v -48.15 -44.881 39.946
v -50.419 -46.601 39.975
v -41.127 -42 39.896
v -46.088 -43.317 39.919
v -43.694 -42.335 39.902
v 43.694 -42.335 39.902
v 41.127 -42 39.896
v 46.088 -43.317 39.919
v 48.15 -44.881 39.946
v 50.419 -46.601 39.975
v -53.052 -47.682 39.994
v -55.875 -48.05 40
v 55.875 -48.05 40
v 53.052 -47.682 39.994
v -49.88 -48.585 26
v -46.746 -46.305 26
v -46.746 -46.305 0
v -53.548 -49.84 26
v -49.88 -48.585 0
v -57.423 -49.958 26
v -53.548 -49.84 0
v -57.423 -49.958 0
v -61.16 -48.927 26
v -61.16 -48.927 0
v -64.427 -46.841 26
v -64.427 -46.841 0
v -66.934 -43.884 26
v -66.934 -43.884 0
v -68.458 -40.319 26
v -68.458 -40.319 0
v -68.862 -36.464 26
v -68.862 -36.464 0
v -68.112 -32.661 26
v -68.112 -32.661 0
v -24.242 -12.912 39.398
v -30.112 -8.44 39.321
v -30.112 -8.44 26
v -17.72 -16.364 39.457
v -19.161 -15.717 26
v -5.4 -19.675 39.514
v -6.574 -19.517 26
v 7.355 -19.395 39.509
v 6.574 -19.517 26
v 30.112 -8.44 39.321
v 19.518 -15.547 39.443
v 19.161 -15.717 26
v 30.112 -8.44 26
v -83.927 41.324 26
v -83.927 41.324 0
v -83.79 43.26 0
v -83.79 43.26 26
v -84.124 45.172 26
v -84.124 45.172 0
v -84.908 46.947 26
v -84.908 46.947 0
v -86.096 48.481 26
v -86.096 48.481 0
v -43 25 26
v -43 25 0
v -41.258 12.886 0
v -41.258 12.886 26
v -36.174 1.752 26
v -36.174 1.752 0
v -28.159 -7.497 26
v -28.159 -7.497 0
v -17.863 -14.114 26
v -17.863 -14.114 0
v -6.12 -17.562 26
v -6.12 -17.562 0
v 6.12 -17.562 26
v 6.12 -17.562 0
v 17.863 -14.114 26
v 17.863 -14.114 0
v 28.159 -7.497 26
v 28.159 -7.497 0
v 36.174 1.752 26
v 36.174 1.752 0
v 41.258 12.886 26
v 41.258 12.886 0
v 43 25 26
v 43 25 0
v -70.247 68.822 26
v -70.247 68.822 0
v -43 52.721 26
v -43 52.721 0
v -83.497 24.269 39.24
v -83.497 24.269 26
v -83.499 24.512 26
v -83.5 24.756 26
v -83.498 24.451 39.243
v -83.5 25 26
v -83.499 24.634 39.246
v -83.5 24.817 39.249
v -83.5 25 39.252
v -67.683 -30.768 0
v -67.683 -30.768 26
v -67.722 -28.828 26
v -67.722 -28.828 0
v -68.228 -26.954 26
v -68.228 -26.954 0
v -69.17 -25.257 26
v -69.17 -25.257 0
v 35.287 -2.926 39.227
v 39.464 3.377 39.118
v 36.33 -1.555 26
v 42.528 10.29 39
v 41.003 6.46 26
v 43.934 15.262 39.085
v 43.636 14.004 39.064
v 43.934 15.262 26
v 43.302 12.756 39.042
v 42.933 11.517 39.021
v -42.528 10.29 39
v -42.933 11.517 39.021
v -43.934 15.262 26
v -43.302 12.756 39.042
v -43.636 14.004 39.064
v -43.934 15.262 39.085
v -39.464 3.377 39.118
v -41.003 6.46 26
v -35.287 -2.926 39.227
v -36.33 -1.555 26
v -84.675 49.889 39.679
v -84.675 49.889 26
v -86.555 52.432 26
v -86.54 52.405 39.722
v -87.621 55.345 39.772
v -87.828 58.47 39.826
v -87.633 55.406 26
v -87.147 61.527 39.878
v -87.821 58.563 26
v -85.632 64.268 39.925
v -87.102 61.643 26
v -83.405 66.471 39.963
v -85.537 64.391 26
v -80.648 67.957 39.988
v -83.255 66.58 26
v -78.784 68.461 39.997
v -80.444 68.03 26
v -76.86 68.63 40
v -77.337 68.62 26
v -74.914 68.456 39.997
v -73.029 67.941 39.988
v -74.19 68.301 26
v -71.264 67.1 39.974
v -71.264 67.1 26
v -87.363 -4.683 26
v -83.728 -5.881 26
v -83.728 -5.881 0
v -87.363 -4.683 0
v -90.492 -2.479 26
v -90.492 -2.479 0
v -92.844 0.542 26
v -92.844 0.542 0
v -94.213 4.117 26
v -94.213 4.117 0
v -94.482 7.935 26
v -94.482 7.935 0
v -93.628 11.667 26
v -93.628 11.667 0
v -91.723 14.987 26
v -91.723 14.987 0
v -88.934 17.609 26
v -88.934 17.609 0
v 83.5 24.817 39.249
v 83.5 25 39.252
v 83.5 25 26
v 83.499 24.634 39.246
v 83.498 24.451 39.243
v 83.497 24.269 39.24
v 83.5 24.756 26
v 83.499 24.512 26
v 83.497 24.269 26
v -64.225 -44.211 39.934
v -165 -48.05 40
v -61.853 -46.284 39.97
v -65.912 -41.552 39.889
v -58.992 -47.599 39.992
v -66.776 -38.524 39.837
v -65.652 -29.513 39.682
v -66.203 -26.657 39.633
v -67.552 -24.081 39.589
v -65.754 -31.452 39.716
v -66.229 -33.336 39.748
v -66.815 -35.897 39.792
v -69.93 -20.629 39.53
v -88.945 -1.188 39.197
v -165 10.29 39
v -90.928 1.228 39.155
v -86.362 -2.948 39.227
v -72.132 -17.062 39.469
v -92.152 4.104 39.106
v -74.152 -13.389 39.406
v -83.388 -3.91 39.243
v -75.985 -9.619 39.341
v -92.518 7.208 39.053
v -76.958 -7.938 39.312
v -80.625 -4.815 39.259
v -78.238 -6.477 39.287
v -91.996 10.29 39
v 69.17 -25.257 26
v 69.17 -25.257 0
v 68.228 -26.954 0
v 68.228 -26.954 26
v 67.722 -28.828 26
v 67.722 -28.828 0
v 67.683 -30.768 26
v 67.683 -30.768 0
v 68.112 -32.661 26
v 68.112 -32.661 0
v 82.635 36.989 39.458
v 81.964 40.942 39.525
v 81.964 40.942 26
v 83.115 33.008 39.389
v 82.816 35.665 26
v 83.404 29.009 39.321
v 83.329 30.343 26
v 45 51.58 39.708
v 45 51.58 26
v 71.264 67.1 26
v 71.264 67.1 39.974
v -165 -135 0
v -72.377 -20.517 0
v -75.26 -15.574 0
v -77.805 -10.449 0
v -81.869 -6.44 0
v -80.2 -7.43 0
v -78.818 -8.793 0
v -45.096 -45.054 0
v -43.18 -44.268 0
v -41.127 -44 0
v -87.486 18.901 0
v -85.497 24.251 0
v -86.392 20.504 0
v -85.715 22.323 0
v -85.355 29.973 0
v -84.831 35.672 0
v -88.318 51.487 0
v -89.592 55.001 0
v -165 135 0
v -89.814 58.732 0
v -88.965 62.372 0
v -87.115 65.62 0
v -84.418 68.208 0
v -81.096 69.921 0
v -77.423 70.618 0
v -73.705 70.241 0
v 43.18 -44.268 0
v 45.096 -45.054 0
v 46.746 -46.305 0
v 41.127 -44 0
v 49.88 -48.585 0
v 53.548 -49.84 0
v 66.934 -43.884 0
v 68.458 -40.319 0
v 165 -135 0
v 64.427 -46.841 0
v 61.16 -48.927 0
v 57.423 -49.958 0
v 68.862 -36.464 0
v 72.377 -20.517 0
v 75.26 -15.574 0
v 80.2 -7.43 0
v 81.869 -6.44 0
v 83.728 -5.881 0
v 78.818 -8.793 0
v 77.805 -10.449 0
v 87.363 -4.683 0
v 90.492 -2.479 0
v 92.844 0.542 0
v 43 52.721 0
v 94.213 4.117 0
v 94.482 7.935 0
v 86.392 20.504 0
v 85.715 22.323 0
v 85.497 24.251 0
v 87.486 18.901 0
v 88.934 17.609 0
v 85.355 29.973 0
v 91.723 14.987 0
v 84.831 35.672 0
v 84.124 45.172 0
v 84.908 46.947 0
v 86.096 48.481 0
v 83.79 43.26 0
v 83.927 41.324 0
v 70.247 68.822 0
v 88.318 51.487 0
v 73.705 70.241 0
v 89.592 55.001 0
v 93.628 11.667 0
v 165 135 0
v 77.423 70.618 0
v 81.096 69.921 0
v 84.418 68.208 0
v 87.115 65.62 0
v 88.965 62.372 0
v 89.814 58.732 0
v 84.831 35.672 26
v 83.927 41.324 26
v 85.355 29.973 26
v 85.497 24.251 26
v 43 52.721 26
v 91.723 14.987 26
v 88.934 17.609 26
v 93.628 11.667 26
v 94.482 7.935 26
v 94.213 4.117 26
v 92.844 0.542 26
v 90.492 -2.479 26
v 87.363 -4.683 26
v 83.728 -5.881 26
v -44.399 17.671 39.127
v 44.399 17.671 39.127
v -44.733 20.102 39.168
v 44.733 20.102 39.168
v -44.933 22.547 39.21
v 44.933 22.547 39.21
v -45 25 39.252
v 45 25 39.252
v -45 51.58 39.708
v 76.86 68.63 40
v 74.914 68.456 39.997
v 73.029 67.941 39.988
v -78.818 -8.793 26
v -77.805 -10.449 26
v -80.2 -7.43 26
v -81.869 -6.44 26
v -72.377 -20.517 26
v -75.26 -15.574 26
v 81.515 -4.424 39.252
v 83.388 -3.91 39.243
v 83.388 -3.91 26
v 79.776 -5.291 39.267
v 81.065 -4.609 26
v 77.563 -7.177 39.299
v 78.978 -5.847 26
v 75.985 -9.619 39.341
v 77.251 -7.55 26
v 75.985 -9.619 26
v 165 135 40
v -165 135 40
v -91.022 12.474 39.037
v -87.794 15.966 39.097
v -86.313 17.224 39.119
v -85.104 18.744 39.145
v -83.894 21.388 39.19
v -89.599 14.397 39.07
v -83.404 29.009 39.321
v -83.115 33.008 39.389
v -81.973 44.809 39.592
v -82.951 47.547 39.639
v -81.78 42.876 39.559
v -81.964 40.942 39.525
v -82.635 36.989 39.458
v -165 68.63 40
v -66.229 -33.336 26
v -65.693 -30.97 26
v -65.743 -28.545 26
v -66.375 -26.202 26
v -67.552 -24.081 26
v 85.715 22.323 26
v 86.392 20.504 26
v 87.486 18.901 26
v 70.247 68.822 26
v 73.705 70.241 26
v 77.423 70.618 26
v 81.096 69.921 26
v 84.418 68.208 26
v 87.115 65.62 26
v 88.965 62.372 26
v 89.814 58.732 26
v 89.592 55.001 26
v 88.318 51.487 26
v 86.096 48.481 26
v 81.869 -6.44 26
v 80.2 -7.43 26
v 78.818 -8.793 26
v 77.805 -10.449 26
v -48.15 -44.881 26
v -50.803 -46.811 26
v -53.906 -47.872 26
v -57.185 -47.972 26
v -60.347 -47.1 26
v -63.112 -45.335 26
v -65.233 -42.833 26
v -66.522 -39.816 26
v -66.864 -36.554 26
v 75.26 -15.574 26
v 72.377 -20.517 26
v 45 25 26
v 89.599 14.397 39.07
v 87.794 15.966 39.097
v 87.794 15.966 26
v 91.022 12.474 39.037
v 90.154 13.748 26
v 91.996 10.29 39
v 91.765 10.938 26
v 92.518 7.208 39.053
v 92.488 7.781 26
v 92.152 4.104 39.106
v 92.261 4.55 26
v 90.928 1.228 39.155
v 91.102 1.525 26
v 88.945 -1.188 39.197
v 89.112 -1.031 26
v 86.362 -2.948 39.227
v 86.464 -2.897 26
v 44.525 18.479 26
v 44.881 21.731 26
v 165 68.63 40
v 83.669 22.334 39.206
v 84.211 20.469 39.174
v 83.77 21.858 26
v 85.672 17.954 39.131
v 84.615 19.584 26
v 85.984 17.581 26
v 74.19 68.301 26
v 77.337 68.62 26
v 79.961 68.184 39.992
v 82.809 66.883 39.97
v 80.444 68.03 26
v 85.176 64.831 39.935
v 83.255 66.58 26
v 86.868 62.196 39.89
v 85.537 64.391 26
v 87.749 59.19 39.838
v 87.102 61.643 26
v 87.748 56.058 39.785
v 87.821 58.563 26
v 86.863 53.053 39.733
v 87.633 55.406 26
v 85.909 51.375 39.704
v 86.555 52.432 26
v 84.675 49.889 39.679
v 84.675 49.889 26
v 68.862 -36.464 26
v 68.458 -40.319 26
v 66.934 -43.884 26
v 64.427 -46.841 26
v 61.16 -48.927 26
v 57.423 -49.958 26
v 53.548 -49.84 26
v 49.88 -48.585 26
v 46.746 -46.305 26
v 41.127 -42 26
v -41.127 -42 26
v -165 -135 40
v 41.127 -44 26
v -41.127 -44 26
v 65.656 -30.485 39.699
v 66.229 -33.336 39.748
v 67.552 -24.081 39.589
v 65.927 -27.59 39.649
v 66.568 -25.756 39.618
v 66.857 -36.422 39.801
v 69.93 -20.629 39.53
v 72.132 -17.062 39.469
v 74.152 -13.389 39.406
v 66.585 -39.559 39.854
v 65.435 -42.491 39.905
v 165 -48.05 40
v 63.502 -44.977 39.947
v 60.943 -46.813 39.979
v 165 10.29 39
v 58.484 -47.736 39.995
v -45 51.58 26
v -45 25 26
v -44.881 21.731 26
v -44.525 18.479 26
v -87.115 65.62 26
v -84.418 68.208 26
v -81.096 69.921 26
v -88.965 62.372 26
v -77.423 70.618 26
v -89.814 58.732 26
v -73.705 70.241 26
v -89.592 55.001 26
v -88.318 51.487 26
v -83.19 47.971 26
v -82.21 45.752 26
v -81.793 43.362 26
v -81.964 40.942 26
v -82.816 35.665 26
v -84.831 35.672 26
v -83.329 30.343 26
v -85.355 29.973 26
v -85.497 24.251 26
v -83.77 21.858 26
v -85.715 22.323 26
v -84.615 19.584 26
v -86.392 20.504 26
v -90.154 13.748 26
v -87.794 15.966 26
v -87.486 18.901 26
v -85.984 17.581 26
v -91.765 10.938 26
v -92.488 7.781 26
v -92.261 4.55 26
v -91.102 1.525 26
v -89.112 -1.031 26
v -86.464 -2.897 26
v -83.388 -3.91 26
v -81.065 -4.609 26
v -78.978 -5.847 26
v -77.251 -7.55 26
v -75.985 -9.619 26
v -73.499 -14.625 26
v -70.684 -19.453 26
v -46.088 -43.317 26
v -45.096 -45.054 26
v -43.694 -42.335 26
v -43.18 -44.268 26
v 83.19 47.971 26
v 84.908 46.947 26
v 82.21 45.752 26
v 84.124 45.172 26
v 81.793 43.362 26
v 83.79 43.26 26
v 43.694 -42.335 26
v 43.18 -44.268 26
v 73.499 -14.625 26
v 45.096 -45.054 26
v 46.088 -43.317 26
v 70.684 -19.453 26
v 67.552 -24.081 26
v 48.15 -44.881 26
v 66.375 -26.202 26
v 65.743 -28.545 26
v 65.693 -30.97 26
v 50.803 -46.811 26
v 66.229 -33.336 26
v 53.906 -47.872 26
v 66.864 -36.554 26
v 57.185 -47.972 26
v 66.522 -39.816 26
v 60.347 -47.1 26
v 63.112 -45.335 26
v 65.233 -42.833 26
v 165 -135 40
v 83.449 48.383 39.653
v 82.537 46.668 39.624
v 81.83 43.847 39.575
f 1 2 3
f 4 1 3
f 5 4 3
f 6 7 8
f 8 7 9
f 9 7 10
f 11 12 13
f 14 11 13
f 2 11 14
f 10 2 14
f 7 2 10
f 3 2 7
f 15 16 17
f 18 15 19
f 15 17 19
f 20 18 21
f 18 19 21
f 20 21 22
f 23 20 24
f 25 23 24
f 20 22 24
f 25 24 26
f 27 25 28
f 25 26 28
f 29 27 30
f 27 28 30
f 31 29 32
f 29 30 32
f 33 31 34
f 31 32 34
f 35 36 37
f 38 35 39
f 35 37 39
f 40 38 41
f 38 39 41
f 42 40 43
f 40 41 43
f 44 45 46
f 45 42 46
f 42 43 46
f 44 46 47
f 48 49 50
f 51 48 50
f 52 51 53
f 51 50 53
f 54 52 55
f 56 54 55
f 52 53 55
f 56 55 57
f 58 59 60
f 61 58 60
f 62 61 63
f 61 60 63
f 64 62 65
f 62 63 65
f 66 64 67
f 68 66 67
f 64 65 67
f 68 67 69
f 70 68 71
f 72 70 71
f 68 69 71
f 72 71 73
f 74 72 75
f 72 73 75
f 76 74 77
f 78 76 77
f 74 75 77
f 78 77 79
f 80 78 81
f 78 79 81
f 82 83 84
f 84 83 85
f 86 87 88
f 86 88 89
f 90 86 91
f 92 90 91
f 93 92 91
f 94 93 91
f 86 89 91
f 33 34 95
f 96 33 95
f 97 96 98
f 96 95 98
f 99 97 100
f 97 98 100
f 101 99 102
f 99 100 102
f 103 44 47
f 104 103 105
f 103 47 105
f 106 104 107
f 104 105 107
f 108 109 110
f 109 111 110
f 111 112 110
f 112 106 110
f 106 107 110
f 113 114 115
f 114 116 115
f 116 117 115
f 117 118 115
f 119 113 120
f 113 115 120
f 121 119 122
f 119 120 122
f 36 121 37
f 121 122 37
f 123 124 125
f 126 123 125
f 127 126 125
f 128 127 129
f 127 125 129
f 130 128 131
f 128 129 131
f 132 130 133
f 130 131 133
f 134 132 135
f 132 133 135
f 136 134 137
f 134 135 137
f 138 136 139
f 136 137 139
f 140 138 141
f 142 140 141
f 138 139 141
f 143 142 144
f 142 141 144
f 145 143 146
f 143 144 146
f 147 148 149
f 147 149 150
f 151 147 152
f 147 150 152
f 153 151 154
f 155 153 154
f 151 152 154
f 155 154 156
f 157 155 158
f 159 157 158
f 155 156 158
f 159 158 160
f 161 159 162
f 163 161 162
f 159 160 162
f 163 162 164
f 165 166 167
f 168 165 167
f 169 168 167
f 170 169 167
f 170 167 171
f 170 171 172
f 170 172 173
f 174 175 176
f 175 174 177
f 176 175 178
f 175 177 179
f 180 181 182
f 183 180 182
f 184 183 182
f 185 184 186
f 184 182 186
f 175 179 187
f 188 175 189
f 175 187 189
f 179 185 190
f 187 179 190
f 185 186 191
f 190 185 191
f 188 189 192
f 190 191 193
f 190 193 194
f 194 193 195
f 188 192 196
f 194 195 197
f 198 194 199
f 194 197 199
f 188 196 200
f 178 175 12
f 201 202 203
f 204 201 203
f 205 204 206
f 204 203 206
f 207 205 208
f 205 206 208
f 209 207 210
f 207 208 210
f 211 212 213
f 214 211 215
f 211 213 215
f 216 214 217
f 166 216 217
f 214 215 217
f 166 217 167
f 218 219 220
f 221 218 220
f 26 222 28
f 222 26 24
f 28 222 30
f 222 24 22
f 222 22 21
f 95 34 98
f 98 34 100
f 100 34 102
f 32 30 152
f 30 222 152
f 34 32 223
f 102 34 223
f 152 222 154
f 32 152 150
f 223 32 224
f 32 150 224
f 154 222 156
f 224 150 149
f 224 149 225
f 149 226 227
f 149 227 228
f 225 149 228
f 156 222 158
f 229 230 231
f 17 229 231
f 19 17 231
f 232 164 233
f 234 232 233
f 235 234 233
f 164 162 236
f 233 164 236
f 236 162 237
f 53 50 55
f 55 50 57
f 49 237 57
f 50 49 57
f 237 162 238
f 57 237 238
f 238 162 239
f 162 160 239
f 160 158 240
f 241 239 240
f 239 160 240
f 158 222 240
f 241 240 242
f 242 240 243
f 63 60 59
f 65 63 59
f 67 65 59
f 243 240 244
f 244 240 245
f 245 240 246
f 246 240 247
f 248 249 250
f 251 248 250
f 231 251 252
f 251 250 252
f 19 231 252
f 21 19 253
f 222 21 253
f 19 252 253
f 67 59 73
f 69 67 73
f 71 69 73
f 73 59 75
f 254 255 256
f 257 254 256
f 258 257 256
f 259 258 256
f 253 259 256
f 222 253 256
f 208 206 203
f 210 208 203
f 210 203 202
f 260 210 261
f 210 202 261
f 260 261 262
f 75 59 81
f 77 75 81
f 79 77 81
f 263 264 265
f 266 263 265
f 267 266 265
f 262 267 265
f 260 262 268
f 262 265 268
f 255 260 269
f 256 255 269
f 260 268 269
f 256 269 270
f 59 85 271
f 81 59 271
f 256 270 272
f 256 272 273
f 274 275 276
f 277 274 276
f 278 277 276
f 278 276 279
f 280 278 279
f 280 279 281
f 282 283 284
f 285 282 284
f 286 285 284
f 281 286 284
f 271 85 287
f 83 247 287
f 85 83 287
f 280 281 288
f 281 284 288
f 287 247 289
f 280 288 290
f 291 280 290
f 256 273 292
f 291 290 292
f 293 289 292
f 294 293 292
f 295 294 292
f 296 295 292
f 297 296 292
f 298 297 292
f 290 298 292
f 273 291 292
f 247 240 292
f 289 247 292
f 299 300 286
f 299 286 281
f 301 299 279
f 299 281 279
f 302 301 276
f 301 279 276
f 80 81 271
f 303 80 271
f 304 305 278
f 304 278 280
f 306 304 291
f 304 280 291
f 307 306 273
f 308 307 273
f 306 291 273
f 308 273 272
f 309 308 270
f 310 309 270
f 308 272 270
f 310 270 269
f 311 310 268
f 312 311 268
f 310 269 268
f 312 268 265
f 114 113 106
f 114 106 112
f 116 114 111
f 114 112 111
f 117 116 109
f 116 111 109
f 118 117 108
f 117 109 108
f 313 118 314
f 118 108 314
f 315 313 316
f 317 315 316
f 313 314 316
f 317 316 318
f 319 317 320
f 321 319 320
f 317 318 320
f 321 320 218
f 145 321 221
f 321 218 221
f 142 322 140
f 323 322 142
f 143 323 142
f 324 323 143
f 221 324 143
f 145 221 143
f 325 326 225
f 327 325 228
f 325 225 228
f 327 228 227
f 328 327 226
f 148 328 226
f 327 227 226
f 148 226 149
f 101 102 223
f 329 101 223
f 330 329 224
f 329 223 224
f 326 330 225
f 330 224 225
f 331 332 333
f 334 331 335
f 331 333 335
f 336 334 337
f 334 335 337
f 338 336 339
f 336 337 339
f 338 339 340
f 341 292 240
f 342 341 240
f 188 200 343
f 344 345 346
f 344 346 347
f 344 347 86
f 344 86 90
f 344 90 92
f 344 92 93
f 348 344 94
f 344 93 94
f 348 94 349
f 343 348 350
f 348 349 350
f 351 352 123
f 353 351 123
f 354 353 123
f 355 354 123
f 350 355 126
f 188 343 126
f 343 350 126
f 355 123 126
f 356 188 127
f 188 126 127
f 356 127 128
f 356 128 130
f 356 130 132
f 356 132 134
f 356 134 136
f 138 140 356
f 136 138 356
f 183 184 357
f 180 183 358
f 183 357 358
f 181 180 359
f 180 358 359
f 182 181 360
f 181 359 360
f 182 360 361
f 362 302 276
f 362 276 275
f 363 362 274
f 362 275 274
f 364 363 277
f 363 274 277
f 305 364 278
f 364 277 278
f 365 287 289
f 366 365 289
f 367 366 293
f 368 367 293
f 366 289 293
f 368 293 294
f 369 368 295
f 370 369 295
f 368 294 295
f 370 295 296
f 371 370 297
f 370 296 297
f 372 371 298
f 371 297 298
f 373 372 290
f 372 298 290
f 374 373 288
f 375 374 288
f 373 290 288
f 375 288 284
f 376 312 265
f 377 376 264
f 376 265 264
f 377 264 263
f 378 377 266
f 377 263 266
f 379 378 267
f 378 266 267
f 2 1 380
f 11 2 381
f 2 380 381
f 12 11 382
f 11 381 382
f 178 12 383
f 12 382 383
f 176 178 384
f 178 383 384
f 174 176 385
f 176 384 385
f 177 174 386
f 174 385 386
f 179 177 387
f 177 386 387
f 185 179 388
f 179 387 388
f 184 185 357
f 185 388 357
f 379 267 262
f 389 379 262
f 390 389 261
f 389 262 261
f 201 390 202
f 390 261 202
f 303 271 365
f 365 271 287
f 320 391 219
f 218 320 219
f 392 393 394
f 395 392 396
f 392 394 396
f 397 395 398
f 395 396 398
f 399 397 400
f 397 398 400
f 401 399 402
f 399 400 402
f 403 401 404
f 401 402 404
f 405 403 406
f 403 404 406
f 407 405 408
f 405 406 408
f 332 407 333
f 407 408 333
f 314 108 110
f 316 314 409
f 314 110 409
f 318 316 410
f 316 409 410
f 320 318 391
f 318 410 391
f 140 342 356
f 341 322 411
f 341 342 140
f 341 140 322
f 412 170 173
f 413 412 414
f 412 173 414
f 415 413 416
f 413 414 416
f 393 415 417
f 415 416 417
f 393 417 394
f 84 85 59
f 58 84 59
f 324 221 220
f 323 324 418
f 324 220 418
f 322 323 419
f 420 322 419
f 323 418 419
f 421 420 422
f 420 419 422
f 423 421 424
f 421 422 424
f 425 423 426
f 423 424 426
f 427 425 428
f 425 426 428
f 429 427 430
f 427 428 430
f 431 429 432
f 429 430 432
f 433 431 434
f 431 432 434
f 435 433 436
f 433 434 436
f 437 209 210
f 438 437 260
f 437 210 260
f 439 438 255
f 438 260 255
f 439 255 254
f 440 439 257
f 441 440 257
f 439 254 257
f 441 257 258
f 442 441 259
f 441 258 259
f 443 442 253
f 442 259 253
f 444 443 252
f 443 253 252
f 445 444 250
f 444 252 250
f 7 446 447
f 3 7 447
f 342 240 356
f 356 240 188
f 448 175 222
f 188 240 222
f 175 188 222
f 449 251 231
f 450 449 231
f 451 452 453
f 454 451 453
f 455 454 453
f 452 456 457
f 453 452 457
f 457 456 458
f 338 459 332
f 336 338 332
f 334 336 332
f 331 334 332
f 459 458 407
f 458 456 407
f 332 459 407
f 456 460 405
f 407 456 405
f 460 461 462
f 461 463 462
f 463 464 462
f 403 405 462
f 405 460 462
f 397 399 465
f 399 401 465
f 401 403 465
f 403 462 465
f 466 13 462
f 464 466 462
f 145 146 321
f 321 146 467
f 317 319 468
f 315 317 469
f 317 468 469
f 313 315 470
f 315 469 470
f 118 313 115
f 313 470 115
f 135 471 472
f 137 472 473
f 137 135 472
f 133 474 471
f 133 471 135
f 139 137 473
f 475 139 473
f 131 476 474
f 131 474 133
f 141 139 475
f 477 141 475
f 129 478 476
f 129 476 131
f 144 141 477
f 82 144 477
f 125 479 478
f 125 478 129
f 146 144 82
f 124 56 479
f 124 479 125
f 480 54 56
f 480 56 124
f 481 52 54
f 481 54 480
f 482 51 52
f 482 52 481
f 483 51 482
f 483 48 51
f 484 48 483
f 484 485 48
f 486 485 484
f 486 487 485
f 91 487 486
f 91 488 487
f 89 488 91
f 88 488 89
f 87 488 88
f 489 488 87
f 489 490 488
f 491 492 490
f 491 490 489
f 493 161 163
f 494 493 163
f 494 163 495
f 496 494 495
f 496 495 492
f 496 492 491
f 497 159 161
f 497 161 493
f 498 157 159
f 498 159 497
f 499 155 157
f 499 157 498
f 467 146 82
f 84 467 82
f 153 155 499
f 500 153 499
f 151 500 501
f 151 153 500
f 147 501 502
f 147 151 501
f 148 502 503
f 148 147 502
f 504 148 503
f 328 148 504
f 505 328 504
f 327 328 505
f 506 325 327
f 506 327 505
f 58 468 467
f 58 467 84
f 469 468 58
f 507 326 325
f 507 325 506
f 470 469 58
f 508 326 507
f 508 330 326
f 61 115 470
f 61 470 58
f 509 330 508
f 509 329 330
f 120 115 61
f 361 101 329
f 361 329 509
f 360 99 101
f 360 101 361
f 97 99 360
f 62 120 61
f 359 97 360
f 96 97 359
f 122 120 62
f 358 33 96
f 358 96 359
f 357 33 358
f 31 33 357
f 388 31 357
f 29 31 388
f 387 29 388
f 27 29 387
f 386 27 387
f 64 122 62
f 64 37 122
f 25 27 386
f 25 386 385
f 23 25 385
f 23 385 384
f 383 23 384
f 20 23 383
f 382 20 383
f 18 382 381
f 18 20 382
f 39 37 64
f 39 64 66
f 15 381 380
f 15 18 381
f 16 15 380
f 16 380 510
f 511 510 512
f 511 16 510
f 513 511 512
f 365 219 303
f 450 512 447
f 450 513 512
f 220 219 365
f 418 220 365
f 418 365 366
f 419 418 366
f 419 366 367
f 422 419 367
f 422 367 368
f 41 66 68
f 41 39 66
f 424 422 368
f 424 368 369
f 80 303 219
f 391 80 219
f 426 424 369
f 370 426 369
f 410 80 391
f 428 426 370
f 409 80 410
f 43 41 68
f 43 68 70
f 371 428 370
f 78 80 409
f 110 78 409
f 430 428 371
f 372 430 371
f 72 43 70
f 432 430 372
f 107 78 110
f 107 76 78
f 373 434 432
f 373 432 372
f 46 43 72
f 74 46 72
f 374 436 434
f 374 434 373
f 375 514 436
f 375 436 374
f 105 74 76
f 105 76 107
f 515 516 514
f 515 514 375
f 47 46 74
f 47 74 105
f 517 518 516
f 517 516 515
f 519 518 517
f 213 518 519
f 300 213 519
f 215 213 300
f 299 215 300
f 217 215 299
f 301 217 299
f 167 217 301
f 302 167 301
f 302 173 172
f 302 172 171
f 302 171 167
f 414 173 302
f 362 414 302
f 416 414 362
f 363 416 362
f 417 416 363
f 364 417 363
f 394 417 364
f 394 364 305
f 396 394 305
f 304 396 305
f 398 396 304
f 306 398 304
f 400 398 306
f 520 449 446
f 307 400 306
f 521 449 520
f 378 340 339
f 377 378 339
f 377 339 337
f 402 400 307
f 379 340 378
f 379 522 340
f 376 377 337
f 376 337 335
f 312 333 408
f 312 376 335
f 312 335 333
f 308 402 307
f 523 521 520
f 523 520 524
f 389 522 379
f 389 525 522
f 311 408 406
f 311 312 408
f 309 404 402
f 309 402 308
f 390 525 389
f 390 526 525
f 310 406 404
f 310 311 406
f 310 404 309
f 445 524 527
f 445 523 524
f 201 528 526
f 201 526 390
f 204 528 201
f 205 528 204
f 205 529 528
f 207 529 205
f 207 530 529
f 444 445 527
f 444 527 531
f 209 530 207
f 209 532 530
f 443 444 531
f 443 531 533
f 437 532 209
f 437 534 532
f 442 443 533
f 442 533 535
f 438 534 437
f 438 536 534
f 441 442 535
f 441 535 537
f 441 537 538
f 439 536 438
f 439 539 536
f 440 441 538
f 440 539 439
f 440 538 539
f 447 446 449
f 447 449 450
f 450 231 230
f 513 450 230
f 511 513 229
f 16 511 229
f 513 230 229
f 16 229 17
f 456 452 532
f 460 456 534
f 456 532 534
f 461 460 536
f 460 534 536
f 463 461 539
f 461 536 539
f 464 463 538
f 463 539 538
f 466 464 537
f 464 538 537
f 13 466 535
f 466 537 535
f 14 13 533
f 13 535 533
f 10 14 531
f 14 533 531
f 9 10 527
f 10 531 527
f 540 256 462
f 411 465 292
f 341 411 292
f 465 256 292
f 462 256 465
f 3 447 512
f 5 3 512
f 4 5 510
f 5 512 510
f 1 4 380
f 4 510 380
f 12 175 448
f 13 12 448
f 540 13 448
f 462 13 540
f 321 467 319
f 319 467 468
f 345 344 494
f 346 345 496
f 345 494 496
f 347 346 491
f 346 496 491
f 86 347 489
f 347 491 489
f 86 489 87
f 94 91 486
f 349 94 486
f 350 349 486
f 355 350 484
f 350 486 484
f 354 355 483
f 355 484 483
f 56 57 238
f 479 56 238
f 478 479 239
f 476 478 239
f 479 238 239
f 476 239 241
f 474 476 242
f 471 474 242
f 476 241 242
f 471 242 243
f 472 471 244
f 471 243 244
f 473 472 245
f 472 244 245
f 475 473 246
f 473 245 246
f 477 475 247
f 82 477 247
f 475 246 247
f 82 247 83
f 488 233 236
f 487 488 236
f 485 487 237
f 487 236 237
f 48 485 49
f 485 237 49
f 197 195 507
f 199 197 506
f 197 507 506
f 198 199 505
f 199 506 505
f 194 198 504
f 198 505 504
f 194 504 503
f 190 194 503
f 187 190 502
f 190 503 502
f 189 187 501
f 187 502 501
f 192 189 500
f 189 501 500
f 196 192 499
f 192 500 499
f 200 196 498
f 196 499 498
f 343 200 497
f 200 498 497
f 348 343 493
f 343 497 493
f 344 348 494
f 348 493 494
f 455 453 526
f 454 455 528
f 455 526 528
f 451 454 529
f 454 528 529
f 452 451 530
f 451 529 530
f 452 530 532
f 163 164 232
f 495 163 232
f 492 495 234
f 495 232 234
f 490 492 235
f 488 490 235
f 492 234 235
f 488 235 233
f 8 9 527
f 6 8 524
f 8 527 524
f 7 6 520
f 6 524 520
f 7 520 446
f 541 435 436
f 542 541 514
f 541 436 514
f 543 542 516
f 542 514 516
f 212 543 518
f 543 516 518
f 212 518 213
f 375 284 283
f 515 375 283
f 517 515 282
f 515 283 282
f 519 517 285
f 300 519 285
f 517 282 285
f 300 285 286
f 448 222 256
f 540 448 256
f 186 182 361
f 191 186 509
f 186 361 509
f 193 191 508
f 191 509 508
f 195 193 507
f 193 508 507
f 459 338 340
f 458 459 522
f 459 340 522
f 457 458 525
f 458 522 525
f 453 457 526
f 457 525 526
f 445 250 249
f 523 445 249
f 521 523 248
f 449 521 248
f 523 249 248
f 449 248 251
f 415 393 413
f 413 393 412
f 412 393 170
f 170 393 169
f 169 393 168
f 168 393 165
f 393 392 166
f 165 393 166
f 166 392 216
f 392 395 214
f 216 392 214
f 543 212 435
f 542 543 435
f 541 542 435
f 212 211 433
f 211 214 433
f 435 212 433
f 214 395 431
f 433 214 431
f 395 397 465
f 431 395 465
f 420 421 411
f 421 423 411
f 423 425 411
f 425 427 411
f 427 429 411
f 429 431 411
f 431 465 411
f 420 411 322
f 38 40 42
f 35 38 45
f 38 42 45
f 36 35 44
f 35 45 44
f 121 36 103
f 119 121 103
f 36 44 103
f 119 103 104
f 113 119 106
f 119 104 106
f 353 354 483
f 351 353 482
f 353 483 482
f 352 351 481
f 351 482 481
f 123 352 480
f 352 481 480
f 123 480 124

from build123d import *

# Parameters (mm, degrees)
F1_DEPTH = 40
F3_DEPTH = 26
F6_DEPTH = 376


with BuildPart() as f1:
    # F0 (on Top) → F1 (new body)
    with BuildSketch(Plane.XY):
        with BuildLine():
            Line((165, -135), (165, 25))
            Line((165, 25), (83.5, 25))
            ThreePointArc((83.5, 25), (83.4991991535, 24.6342942061), (83.4967966293, 24.2685954271))
            ThreePointArc((83.4967966293, 24.2685954271), (84.6154885355, 19.5843531992), (87.7939862549, 15.9662391769))
            ThreePointArc((87.7939862549, 15.9662391769), (92.2606519972, 4.5495209581), (83.3881264287, -3.9104345842))
            ThreePointArc((83.3881264287, -3.9104345842), (78.9784767448, -5.8465612578), (75.9852018745, -9.6193456912))
            ThreePointArc((75.9852018745, -9.6193456912), (72.1319392895, -17.0622554594), (67.5519565242, -24.0813933151))
            ThreePointArc((67.5519565242, -24.0813933151), (65.7426065331, -28.544559169), (66.2292845484, -33.3358785427))
            ThreePointArc((66.2292845484, -33.3358785427), (61.7955930136, -46.3209199003), (48.1502490008, -44.880952381))
            ThreePointArc((48.1502490008, -44.880952381), (44.922849365, -42.7482305425), (41.1274887886, -42))
            Line((41.1274887886, -42), (-41.1274887886, -42))
            ThreePointArc((-41.1274887886, -42), (-44.922849365, -42.7482305425), (-48.1502490008, -44.880952381))
            ThreePointArc((-48.1502490008, -44.880952381), (-61.7955930136, -46.3209199003), (-66.2292845484, -33.3358785427))
            ThreePointArc((-66.2292845484, -33.3358785427), (-65.7426065331, -28.544559169), (-67.5519565242, -24.0813933151))
            ThreePointArc((-67.5519565242, -24.0813933151), (-72.1319392895, -17.0622554594), (-75.9852018745, -9.6193456912))
            ThreePointArc((-75.9852018745, -9.6193456912), (-78.9784767448, -5.8465612578), (-83.3881264287, -3.9104345842))
            ThreePointArc((-83.3881264287, -3.9104345842), (-92.2606519972, 4.5495209581), (-87.7939862549, 15.9662391769))
            ThreePointArc((-87.7939862549, 15.9662391769), (-84.6154885355, 19.5843531992), (-83.4967966293, 24.2685954271))
            ThreePointArc((-83.4967966293, 24.2685954271), (-83.4991991535, 24.6342942061), (-83.5, 25))
            Line((-83.5, 25), (-165, 25))
            Line((-165, 25), (-165, -135))
            Line((-165, -135), (165, -135))
        make_face()
        with BuildLine():
            Line((165, 25), (165, 135))
            Line((165, 135), (-165, 135))
            Line((-165, 135), (-165, 25))
            Line((-165, 25), (-83.5, 25))
            ThreePointArc((-83.5, 25), (-83.1151125621, 33.0079999869), (-81.9639984721, 40.9421753368))
            ThreePointArc((-81.9639984721, 40.9421753368), (-82.2099154551, 45.7518657289), (-84.6754899777, 49.8888379435))
            ThreePointArc((-84.6754899777, 49.8888379435), (-85.5373543192, 64.3910516772), (-71.2643792291, 67.1001466184))
            Line((-71.2643792291, 67.1001466184), (-45, 51.58))
            Line((-45, 51.58), (-45, 44.1040966114))
            Line((-45, 44.1040966114), (-45, 25))
            Line((-45, 25), (0, 25))
            Line((0, 25), (45, 25))
            Line((45, 25), (45, 44.1040966114))
            Line((45, 44.1040966114), (45, 51.58))
            Line((45, 51.58), (71.2643792291, 67.1001466184))
            ThreePointArc((71.2643792291, 67.1001466184), (85.5373543192, 64.3910516772), (84.6754899777, 49.8888379435))
            ThreePointArc((84.6754899777, 49.8888379435), (82.2099154551, 45.7518657289), (81.9639984721, 40.9421753368))
            ThreePointArc((81.9639984721, 40.9421753368), (83.1151125621, 33.0079999869), (83.5, 25))
            Line((83.5, 25), (165, 25))
        make_face()
        with BuildLine():
            Line((0, 25), (-45, 25))
            ThreePointArc((-45, 25), (-44.7326165754, 20.1017335398), (-43.9336438082, 15.2616766467))
            Line((-43.9336438082, 15.2616766467), (0, 25))
        make_face()
        with BuildLine():
            Line((-30.1124291681, -8.4401197605), (0, 25))
            Line((0, 25), (-43.9336438082, 15.2616766467))
            ThreePointArc((-43.9336438082, 15.2616766467), (-38.8735002159, 2.3317186147), (-30.1124291681, -8.4401197605))
        make_face()
        with BuildLine():
            Line((30.1124291681, -8.4401197605), (0, 25))
            Line((0, 25), (-30.1124291681, -8.4401197605))
            ThreePointArc((-30.1124291681, -8.4401197605), (0, -20), (30.1124291681, -8.4401197605))
        make_face()
        with BuildLine():
            ThreePointArc((30.1124291681, -8.4401197605), (38.8735002159, 2.3317186147), (43.9336438082, 15.2616766467))
            Line((43.9336438082, 15.2616766467), (0, 25))
            Line((0, 25), (30.1124291681, -8.4401197605))
        make_face()
        with BuildLine():
            ThreePointArc((43.9336438082, 15.2616766467), (44.7326165754, 20.1017335398), (45, 25))
            Line((45, 25), (0, 25))
            Line((0, 25), (43.9336438082, 15.2616766467))
        make_face()
    extrude(amount=F1_DEPTH)

    # F2 (on face) → F3 (cut)
    with BuildSketch(Plane(origin=(0, 0, 0), x_dir=(1, 0, 0), z_dir=(0, 0, -1))):
        with BuildLine():
            Line((41.1274887886, 44), (-41.1274887886, 44))
            ThreePointArc((-41.1274887886, 44), (-44.1637772497, 44.598584434), (-46.7456969583, 46.3047619048))
            ThreePointArc((-46.7456969583, 46.3047619048), (-62.8720126099, 48.0065417003), (-68.1118298783, 32.6605837322))
            ThreePointArc((-68.1118298783, 32.6605837322), (-67.722487466, 28.8275282333), (-69.1699674589, 25.2569955502))
            ThreePointArc((-69.1699674589, 25.2569955502), (-73.8596504102, 18.0697346321), (-77.8052067098, 10.4485515761))
            ThreePointArc((-77.8052067098, 10.4485515761), (-80.1998266061, 7.4303240293), (-83.7275463532, 5.8814226904))
            ThreePointArc((-83.7275463532, 5.8814226904), (-94.2132583887, -4.1167065868), (-88.9344716024, -17.6091917545))
            ThreePointArc((-88.9344716024, -17.6091917545), (-86.3916734268, -20.5036829723), (-85.4967199018, -24.2510767547))
            ThreePointArc((-85.4967199018, -24.2510767547), (-85.1409902363, -32.8269905829), (-83.9272080163, -41.3240238478))
            ThreePointArc((-83.9272080163, -41.3240238478), (-84.1239416027, -45.1717761615), (-86.0964012208, -48.4813539332))
            ThreePointArc((-86.0964012208, -48.4813539332), (-87.1149681698, -65.6203338003), (-70.2469066998, -68.8219914581))
            Line((-70.2469066998, -68.8219914581), (-43, -52.7212497201))
            Line((-43, -52.7212497201), (-43, -25))
            ThreePointArc((-43, -25), (0, 18), (43, -25))
            Line((43, -25), (43, -52.7212497201))
            Line((43, -52.7212497201), (70.2469066998, -68.8219914581))
            ThreePointArc((70.2469066998, -68.8219914581), (87.1149681698, -65.6203338003), (86.0964012208, -48.4813539332))
            ThreePointArc((86.0964012208, -48.4813539332), (84.1239416027, -45.1717761615), (83.9272080163, -41.3240238478))
            ThreePointArc((83.9272080163, -41.3240238478), (85.1409902363, -32.8269905829), (85.4967199018, -24.2510767547))
            ThreePointArc((85.4967199018, -24.2510767547), (86.3916734268, -20.5036829723), (88.9344716024, -17.6091917545))
            ThreePointArc((88.9344716024, -17.6091917545), (94.2132583887, -4.1167065868), (83.7275463532, 5.8814226904))
            ThreePointArc((83.7275463532, 5.8814226904), (80.1998266061, 7.4303240293), (77.8052067098, 10.4485515761))
            ThreePointArc((77.8052067098, 10.4485515761), (73.8596504102, 18.0697346321), (69.1699674589, 25.2569955502))
            ThreePointArc((69.1699674589, 25.2569955502), (67.722487466, 28.8275282333), (68.1118298783, 32.6605837322))
            ThreePointArc((68.1118298783, 32.6605837322), (62.8720126099, 48.0065417003), (46.7456969583, 46.3047619048))
            ThreePointArc((46.7456969583, 46.3047619048), (44.1637772497, 44.598584434), (41.1274887886, 44))
        make_face()
        with BuildLine():
            Line((-45, -51.58), (-71.2643792291, -67.1001466184))
            ThreePointArc((-71.2643792291, -67.1001466184), (-85.5373543192, -64.3910516772), (-84.6754899777, -49.8888379435))
            ThreePointArc((-84.6754899777, -49.8888379435), (-82.2099154551, -45.7518657289), (-81.9639984721, -40.9421753368))
            ThreePointArc((-81.9639984721, -40.9421753368), (-83.1493881255, -32.6439030838), (-83.4967966293, -24.2685954271))
            ThreePointArc((-83.4967966293, -24.2685954271), (-84.6154885355, -19.5843531992), (-87.7939862549, -15.9662391769))
            ThreePointArc((-87.7939862549, -15.9662391769), (-92.2606519972, -4.5495209581), (-83.3881264287, 3.9104345842))
            ThreePointArc((-83.3881264287, 3.9104345842), (-78.9784767448, 5.8465612578), (-75.9852018745, 9.6193456912))
            ThreePointArc((-75.9852018745, 9.6193456912), (-72.1319392895, 17.0622554594), (-67.5519565242, 24.0813933151))
            ThreePointArc((-67.5519565242, 24.0813933151), (-65.7426065331, 28.544559169), (-66.2292845484, 33.3358785427))
            ThreePointArc((-66.2292845484, 33.3358785427), (-61.7955930136, 46.3209199003), (-48.1502490008, 44.880952381))
            ThreePointArc((-48.1502490008, 44.880952381), (-44.922849365, 42.7482305425), (-41.1274887886, 42))
            Line((-41.1274887886, 42), (41.1274887886, 42))
            ThreePointArc((41.1274887886, 42), (44.922849365, 42.7482305425), (48.1502490008, 44.880952381))
            ThreePointArc((48.1502490008, 44.880952381), (61.7955930136, 46.3209199003), (66.2292845484, 33.3358785427))
            ThreePointArc((66.2292845484, 33.3358785427), (65.7426065331, 28.544559169), (67.5519565242, 24.0813933151))
            ThreePointArc((67.5519565242, 24.0813933151), (72.1319392895, 17.0622554594), (75.9852018745, 9.6193456912))
            ThreePointArc((75.9852018745, 9.6193456912), (78.9784767448, 5.8465612578), (83.3881264287, 3.9104345842))
            ThreePointArc((83.3881264287, 3.9104345842), (92.2606519972, -4.5495209581), (87.7939862549, -15.9662391769))
            ThreePointArc((87.7939862549, -15.9662391769), (84.6154885355, -19.5843531992), (83.4967966293, -24.2685954271))
            ThreePointArc((83.4967966293, -24.2685954271), (83.1493881255, -32.6439030838), (81.9639984721, -40.9421753368))
            ThreePointArc((81.9639984721, -40.9421753368), (82.2099154551, -45.7518657289), (84.6754899777, -49.8888379435))
            ThreePointArc((84.6754899777, -49.8888379435), (85.5373543192, -64.3910516772), (71.2643792291, -67.1001466184))
            Line((71.2643792291, -67.1001466184), (45, -51.58))
            Line((45, -51.58), (45, -25))
            ThreePointArc((45, -25), (0, 20), (-45, -25))
            Line((-45, -25), (-45, -51.58))
        make_face(mode=Mode.SUBTRACT)
    extrude(amount=-F3_DEPTH, mode=Mode.SUBTRACT)

    # F5 (on face) → F6 (cut)
    with BuildSketch(Plane.YZ.offset(165)):
        Polygon((10.29, 40), (-48.05, 40), (10.29, 39), align=None)
        Polygon((68.63, 40), (10.29, 40), (10.29, 39), align=None)
    extrude(amount=-F6_DEPTH, mode=Mode.SUBTRACT)


solid = f1.part
